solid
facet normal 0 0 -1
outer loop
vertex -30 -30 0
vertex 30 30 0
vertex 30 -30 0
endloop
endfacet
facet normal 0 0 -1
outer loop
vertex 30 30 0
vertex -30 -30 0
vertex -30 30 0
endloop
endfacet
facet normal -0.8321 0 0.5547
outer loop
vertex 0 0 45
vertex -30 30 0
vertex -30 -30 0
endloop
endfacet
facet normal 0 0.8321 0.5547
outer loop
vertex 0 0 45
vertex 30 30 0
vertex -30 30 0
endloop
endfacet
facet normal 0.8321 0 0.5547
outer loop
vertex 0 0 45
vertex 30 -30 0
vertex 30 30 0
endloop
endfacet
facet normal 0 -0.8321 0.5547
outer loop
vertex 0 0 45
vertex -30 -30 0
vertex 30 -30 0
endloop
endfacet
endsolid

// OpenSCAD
use <MCAD/regular_shapes.scad>
include <MCAD/units.scad>

// Dimensions;
height = 45*mm;
width = 60*mm;

square_pyramid(base_x=width, base_y=width, height=height);
